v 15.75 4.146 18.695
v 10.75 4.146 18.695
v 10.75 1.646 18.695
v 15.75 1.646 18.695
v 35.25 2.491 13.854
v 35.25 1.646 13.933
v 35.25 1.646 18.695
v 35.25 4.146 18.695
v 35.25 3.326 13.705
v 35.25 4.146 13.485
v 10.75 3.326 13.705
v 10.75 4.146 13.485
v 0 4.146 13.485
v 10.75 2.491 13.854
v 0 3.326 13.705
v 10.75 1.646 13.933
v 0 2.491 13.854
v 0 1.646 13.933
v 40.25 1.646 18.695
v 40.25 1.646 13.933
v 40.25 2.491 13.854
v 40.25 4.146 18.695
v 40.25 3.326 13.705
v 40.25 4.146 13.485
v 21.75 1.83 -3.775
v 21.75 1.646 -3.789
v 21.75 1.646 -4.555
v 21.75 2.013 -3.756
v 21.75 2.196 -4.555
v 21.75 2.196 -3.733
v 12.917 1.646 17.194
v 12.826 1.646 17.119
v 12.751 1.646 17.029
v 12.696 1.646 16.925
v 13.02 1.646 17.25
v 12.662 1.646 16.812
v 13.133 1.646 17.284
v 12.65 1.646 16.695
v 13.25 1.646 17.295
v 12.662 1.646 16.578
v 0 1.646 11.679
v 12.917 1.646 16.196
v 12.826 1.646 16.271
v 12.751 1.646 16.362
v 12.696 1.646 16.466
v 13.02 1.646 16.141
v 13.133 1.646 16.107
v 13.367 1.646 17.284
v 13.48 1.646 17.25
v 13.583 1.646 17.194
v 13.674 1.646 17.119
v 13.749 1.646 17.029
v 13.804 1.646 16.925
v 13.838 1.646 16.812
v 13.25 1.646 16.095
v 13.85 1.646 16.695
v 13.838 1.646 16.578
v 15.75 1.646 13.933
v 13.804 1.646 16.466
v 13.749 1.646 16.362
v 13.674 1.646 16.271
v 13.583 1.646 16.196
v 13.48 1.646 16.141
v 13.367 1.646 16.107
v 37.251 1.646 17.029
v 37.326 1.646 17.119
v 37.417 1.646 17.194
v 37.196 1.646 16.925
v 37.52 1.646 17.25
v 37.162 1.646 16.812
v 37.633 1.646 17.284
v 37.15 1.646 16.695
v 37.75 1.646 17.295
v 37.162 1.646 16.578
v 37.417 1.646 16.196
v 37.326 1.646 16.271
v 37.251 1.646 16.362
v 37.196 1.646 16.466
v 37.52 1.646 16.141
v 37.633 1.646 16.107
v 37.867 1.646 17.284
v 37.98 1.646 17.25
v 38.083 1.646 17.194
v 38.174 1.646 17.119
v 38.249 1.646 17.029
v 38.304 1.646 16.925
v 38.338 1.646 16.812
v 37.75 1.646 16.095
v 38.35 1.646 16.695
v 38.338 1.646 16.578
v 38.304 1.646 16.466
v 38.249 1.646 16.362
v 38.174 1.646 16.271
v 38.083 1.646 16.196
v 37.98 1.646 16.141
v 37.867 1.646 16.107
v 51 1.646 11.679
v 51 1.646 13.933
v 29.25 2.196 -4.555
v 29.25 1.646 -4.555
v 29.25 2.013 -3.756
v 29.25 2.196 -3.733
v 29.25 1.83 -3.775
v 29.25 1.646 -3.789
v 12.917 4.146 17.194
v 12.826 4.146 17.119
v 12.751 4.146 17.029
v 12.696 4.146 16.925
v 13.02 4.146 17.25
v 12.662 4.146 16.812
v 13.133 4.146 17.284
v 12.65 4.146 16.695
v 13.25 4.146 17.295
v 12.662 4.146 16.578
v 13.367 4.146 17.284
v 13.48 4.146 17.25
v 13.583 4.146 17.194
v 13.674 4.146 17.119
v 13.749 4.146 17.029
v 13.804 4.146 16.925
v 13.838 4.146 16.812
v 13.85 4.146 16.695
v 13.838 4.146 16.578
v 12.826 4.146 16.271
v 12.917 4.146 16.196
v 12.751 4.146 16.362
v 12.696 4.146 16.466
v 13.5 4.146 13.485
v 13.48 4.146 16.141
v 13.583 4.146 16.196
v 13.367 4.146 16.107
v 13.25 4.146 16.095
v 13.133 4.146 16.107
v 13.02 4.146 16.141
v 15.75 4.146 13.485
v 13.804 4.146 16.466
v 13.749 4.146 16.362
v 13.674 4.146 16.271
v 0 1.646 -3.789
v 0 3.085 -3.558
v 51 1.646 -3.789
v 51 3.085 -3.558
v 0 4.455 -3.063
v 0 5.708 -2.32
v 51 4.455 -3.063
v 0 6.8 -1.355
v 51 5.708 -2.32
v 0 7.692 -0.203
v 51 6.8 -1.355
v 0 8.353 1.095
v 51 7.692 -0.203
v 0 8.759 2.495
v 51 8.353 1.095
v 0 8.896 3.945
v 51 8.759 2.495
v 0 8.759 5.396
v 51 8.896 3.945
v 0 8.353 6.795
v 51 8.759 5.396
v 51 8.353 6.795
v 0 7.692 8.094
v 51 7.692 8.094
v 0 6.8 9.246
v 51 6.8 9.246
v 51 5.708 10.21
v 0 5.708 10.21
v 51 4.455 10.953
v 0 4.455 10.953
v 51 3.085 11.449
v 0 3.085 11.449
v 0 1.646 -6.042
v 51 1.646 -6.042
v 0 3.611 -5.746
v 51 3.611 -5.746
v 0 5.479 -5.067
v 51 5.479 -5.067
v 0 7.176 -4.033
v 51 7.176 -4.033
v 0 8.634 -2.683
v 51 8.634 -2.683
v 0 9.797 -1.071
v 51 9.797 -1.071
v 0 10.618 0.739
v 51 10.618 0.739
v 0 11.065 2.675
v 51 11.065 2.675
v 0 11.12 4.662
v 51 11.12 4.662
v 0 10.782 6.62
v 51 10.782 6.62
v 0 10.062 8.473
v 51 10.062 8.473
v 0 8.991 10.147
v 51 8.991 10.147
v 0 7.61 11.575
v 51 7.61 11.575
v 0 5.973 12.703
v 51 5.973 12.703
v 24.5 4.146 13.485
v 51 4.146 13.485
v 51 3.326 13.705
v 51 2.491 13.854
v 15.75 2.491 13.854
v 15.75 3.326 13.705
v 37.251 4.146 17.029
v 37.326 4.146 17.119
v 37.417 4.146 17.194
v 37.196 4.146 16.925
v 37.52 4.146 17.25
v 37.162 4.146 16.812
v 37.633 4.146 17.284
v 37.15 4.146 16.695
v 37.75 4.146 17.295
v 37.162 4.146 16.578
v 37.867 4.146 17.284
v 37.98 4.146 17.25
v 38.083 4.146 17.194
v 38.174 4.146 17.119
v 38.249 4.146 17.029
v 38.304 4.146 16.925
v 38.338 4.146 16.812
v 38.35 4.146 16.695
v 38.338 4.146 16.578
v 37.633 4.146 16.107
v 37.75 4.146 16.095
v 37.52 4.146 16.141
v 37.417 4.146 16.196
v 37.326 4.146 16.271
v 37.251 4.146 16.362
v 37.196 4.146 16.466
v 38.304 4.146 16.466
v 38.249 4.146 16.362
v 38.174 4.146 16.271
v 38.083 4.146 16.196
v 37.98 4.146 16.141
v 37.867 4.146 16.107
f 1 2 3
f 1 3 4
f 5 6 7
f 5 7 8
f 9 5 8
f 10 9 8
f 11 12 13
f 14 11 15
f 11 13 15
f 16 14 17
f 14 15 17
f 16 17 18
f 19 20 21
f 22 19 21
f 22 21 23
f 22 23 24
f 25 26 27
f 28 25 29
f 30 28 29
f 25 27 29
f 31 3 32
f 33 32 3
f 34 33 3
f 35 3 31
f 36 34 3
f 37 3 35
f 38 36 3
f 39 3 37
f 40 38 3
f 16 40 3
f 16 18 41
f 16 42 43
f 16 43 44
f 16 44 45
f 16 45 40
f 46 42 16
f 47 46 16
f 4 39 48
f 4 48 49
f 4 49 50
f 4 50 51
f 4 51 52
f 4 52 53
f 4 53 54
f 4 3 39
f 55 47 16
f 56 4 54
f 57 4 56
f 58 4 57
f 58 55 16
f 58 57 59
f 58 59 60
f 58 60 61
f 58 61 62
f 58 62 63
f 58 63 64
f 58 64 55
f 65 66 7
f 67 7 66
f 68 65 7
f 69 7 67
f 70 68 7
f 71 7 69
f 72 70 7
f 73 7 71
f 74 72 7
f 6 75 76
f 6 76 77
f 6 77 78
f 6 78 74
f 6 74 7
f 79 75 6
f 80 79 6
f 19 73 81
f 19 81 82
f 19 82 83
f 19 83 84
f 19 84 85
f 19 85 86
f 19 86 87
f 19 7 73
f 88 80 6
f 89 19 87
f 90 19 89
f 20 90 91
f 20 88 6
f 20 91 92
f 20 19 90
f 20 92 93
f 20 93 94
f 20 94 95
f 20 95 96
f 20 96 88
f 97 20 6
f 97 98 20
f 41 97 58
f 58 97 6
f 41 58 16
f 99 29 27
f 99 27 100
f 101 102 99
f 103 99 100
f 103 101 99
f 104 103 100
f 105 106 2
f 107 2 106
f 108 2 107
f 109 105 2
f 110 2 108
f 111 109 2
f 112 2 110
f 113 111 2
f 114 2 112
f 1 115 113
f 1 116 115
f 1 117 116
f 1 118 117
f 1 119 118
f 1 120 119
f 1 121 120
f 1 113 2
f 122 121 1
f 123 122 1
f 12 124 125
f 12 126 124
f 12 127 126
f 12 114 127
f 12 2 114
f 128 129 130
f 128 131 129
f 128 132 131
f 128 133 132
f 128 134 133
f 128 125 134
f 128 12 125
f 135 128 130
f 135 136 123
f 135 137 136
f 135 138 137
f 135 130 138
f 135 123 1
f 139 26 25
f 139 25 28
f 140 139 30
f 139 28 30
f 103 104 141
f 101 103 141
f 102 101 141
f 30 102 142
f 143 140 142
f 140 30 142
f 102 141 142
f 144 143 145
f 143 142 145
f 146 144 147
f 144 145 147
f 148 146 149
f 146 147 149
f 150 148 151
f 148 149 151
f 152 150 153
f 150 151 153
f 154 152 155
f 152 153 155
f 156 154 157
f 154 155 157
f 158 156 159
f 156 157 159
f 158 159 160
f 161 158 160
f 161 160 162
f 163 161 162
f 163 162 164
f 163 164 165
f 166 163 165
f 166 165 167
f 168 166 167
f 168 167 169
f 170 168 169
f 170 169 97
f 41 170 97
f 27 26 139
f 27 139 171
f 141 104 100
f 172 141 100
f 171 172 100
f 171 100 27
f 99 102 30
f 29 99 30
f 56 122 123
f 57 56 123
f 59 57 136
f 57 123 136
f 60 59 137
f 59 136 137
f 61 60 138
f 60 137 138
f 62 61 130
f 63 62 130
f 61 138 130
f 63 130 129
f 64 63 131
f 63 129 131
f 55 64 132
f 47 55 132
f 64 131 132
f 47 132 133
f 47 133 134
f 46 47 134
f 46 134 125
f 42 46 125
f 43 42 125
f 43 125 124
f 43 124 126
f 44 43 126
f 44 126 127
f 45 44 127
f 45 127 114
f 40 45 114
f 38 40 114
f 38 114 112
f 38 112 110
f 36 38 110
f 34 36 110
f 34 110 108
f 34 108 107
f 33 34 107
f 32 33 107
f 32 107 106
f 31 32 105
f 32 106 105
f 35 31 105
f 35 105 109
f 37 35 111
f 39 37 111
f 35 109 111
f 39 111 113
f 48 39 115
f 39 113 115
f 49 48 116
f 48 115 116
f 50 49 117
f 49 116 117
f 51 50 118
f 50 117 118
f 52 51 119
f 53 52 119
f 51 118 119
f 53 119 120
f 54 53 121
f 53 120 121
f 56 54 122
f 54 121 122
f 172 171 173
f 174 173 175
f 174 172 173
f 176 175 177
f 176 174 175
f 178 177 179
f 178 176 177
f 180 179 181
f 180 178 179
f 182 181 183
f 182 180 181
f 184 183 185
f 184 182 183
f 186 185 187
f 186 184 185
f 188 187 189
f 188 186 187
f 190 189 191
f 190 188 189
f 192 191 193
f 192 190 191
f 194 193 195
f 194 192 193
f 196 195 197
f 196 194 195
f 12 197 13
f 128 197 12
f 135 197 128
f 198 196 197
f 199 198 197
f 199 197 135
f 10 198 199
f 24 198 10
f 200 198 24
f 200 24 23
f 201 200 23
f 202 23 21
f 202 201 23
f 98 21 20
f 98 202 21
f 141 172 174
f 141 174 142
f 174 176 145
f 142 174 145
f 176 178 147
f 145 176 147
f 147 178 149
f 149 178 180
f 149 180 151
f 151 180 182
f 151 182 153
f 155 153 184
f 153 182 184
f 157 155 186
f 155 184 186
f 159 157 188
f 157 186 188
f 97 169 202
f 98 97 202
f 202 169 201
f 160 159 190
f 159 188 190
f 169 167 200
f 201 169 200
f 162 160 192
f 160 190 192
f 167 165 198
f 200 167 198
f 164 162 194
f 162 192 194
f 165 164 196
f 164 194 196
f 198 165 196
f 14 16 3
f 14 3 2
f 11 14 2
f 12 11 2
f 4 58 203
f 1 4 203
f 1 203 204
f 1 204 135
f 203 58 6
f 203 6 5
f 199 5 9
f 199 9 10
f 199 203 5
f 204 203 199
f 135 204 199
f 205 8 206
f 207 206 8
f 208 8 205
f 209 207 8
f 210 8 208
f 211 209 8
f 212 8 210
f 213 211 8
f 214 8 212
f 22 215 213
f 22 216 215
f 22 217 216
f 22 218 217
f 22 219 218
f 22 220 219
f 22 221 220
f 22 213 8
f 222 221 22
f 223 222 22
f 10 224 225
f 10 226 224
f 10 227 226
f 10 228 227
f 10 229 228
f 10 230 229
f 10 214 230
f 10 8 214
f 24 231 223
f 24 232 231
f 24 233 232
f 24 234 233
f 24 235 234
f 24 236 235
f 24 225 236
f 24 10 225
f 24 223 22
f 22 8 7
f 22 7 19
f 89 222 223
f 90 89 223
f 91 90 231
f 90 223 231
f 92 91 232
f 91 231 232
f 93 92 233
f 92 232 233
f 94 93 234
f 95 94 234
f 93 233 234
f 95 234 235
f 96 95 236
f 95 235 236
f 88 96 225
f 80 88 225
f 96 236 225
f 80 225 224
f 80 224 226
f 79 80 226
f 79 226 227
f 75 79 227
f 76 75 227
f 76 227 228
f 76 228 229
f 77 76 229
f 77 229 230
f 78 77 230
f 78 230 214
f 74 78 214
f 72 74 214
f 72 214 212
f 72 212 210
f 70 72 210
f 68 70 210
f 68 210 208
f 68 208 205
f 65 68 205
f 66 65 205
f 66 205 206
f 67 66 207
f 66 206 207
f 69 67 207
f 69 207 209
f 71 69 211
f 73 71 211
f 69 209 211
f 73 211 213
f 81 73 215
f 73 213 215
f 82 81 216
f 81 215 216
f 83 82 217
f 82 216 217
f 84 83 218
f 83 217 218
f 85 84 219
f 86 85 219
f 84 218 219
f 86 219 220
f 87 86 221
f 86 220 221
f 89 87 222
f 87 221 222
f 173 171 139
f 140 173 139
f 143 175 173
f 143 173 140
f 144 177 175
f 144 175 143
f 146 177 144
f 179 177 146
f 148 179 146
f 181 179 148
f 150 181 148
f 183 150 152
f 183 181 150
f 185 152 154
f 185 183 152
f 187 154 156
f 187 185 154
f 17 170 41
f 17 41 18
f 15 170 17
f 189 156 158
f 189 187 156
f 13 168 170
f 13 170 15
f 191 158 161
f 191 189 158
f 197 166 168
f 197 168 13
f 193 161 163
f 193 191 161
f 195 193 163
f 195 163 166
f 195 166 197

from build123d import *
from build123d.topology import SkipClean

# Parameters (mm, degrees)
SKETCH1_W                = 34
SKETCH1_H                = 30
BOSS_EXTRUDE2_DEPTH      = 51
SKETCH3_R                = 2.55
CUT_EXTRUDE3_DEPTH       = 10
SKETCH5_R                = 7.75
CUT_EXTRUDE4_DEPTH       = 51
SKETCH6_W                = 7
SKETCH6_H                = 30
CUT_EXTRUDE6_DEPTH       = 51
CUT_EXTRUDE7_DEPTH       = 51
CUT_EXTRUDE9_DEPTH       = 1.5
CUT_EXTRUDE9_DEPTH_BACK  = 1.5
BOSS_EXTRUDE5_DEPTH      = 51
CUT_EXTRUDE10_DEPTH      = 13
CUT_EXTRUDE11_START      = -13
CUT_EXTRUDE11_DEPTH      = 13
SKETCH13_W               = 2
SKETCH13_H               = 6
CUT_EXTRUDE12_DEPTH      = 2
CUT_EXTRUDE13_DEPTH      = 13
CUT_EXTRUDE13_DEPTH_BACK = 11
BOSS_EXTRUDE6_DEPTH      = 2.25
BOSS_EXTRUDE7_DEPTH      = 2.25
BOSS_EXTRUDE8_DEPTH      = 2.25
BOSS_EXTRUDE9_DEPTH      = 2.25
SKETCH22_W               = 5
SKETCH22_H               = 6
BOSS_EXTRUDE10_DEPTH     = 1
SKETCH24_W               = 5
SKETCH24_H               = 6
BOSS_EXTRUDE11_DEPTH     = 1
SKETCH25_R               = 0.6
CUT_EXTRUDE14_DEPTH      = 20
SKETCH26_R               = 2.55
BOSS_EXTRUDE12_DEPTH     = 1.5
CUT_EXTRUDE17_DEPTH      = 60


with BuildPart() as part:
    # Sketch1 → Boss-Extrude2 (new body)
    with BuildSketch(Plane(origin=(0, 0, 0), x_dir=(0, 0, -1), z_dir=(1, 0, 0))):
        with Locations((-3.945183177, 6.145902028)):
            Rectangle(SKETCH1_W, SKETCH1_H)
    extrude(amount=BOSS_EXTRUDE2_DEPTH)

    # Sketch3 → Cut-Extrude3 (cut)
    with BuildSketch(Plane(origin=(0, 0, -13.054816823), x_dir=(-1, 0, 0), z_dir=(0, 0, -1))):
        with Locations((-25.5, -1.354097972)):
            Circle(SKETCH3_R)
    extrude(amount=-CUT_EXTRUDE3_DEPTH, mode=Mode.SUBTRACT)

    # Sketch5 → Cut-Extrude4 (cut)
    with BuildSketch(Plane(origin=(51, 0, 0), x_dir=(0, 0, -1), z_dir=(1, 0, 0))):
        with Locations((-3.945183177, 1.145902028)):
            Circle(SKETCH5_R)
    extrude(amount=-CUT_EXTRUDE4_DEPTH, mode=Mode.SUBTRACT)

    # Sketch6 → Cut-Extrude6 (cut)
    with BuildSketch(Plane(origin=(51, 0, 0), x_dir=(0, 0, -1), z_dir=(1, 0, 0))):
        with Locations((9.554816823, 6.145902028)):
            Rectangle(SKETCH6_W, SKETCH6_H)
    extrude(amount=-CUT_EXTRUDE6_DEPTH, mode=Mode.SUBTRACT)

    # Sketch7 → Cut-Extrude7 (cut)
    with BuildSketch(Plane(origin=(51, 0, 0), x_dir=(0, 0, -1), z_dir=(1, 0, 0))):
        with BuildLine():
            Line((-3.945183177, -8.854097972), (-20.945183177, -8.854097972))
            Line((-20.945183177, -8.854097972), (-20.945183177, 21.145902028))
            Line((-20.945183177, 21.145902028), (6.054816823, 21.145902028))
            Line((6.054816823, 21.145902028), (6.054816823, 1.145902028))
            ThreePointArc((6.054816823, 1.145902028), (-11.016250989, 8.21696984), (-3.945183177, -8.854097972))
        make_face()
    extrude(amount=-CUT_EXTRUDE7_DEPTH, mode=Mode.SUBTRACT)

    # Sketch8 → Cut-Extrude9 (cut, two sides: drawn at the far end of the back side and taken through both)
    with BuildSketch(Plane(origin=(0, 0, -3.054816823), x_dir=(-1, 0, 0), z_dir=(0, 0, -1)).offset(-CUT_EXTRUDE9_DEPTH_BACK)):
        Polygon((-21.75, -2.180131646), (-21.75, -4.904097972), (-29.25, -4.904097972), (-29.25, -2.180131646), (-29.25, 2.195902028), (-21.75, 2.195902028), align=None)
    extrude(amount=CUT_EXTRUDE9_DEPTH + CUT_EXTRUDE9_DEPTH_BACK, mode=Mode.SUBTRACT)

    # Sketch10 → Boss-Extrude5 (add)
    with BuildSketch(Plane(origin=(51, 0, 0), x_dir=(0, 0, -1), z_dir=(1, 0, 0))):
        Polygon((-17.695183177, 1.145902028), (-17.695183177, 4.145902028), (-11.695183177, 4.145902028), (-11.695183177, 1.145902028), (-11.695183177, -1.854097972), (-17.695183177, -1.854097972), align=None)
    extrude(amount=-BOSS_EXTRUDE5_DEPTH)

    # Sketch11 → Cut-Extrude10 (cut)
    with BuildSketch(Plane(origin=(51, 0, 0), x_dir=(0, 0, -1), z_dir=(1, 0, 0))):
        with BuildLine():
            Line((-13.484575191, -1.854097972), (-17.695183177, -1.854097972))
            Line((-17.695183177, -1.854097972), (-17.695183177, 4.145902028))
            Line((-17.695183177, 4.145902028), (-13.484575191, 4.145902028))
            ThreePointArc((-13.484575191, 4.145902028), (-13.945183177, 1.145902028), (-13.484575191, -1.854097972))
        make_face()
    extrude(amount=-CUT_EXTRUDE10_DEPTH, mode=Mode.SUBTRACT)

    # Sketch12 → Cut-Extrude11 (cut)
    with BuildSketch(Plane.ZY.offset(CUT_EXTRUDE11_START)):
        with BuildLine():
            Line((13.484575191, -1.854097972), (17.695183177, -1.854097972))
            Line((17.695183177, -1.854097972), (17.695183177, 4.145902028))
            Line((17.695183177, 4.145902028), (13.484575191, 4.145902028))
            ThreePointArc((13.484575191, 4.145902028), (13.945183177, 1.145902028), (13.484575191, -1.854097972))
        make_face()
    extrude(amount=CUT_EXTRUDE11_DEPTH, mode=Mode.SUBTRACT)

    # Sketch13 → Cut-Extrude12 (cut)
    with BuildSketch(Plane.XY.offset(17.695183177)):
        with Locations((25.5, 1.145902028)):
            Rectangle(SKETCH13_W, SKETCH13_H)
    extrude(amount=-CUT_EXTRUDE12_DEPTH, mode=Mode.SUBTRACT)

    # Sketch15 → Cut-Extrude13 (cut, two sides: drawn at the far end of the back side and taken through both)
    with SkipClean():  # the faces are left unmerged after this step: merging them gives an invalid solid
        with BuildSketch(Plane(origin=(24.5, 0, 0), x_dir=(0, 0, -1), z_dir=(1, 0, 0)).offset(-CUT_EXTRUDE13_DEPTH_BACK)):
            with BuildLine():
                Line((-17.695183177, 4.145902028), (-17.695183177, -1.854097972))
                Line((-17.695183177, -1.854097972), (-13.484575191, -1.854097972))
                ThreePointArc((-13.484575191, -1.854097972), (-13.945183177, 1.145902028), (-13.484575191, 4.145902028))
                Line((-13.484575191, 4.145902028), (-17.695183177, 4.145902028))
            make_face()
        extrude(amount=CUT_EXTRUDE13_DEPTH + CUT_EXTRUDE13_DEPTH_BACK, mode=Mode.SUBTRACT)

    # Sketch17 → Boss-Extrude6 (add)
    with SkipClean():  # the faces are left unmerged after this step: merging them gives an invalid solid
        with BuildSketch(Plane(origin=(38, 0, 0), x_dir=(0, 0, -1), z_dir=(1, 0, 0))):
            with BuildLine():
                Line((-13.484575191, 4.145902028), (-17.695183177, 4.145902028))
                Line((-17.695183177, 4.145902028), (-17.695183177, -1.854097972))
                Line((-17.695183177, -1.854097972), (-13.484575191, -1.854097972))
                ThreePointArc((-13.484575191, -1.854097972), (-13.945183177, 1.145902028), (-13.484575191, 4.145902028))
            make_face()
        extrude(amount=BOSS_EXTRUDE6_DEPTH)

    # Sketch19 → Boss-Extrude7 (add)
    with SkipClean():  # the faces are left unmerged after this step: merging them gives an invalid solid
        with BuildSketch(Plane.ZY.offset(-13)):
            with BuildLine():
                Line((13.484575191, 4.145902028), (17.695183177, 4.145902028))
                Line((17.695183177, 4.145902028), (17.695183177, -1.854097972))
                Line((17.695183177, -1.854097972), (13.484575191, -1.854097972))
                ThreePointArc((13.484575191, -1.854097972), (13.945183177, 1.145902028), (13.484575191, 4.145902028))
            make_face()
        extrude(amount=BOSS_EXTRUDE7_DEPTH)

    # Sketch20 → Boss-Extrude8 (add)
    with SkipClean():  # the faces are left unmerged after this step: merging them gives an invalid solid
        with BuildSketch(Plane(origin=(13.5, 0, 0), x_dir=(0, 0, -1), z_dir=(1, 0, 0))):
            with BuildLine():
                Line((-17.695183177, -1.854097972), (-17.695183177, 4.145902028))
                Line((-17.695183177, 4.145902028), (-13.484575191, 4.145902028))
                ThreePointArc((-13.484575191, 4.145902028), (-13.945183177, 1.145902028), (-13.484575191, -1.854097972))
                Line((-13.484575191, -1.854097972), (-17.695183177, -1.854097972))
            make_face()
        extrude(amount=BOSS_EXTRUDE8_DEPTH)

    # Sketch21 → Boss-Extrude9 (add)
    with SkipClean():  # the faces are left unmerged after this step: merging them gives an invalid solid
        with BuildSketch(Plane.ZY.offset(-37.5)):
            with BuildLine():
                Line((13.484575191, 4.145902028), (17.695183177, 4.145902028))
                Line((17.695183177, 4.145902028), (17.695183177, -1.854097972))
                Line((17.695183177, -1.854097972), (13.484575191, -1.854097972))
                ThreePointArc((13.484575191, -1.854097972), (13.945183177, 1.145902028), (13.484575191, 4.145902028))
            make_face()
        extrude(amount=BOSS_EXTRUDE9_DEPTH)

    # Sketch22 → Boss-Extrude10 (add)
    with SkipClean():  # the faces are left unmerged after this step: merging them gives an invalid solid
        with BuildSketch(Plane.XY.offset(17.695183177)):
            with Locations((37.75, 1.145902028)):
                Rectangle(SKETCH22_W, SKETCH22_H)
        extrude(amount=BOSS_EXTRUDE10_DEPTH)

    # Sketch24 → Boss-Extrude11 (add)
    with SkipClean():  # the faces are left unmerged after this step: merging them gives an invalid solid
        with BuildSketch(Plane.XY.offset(17.695183177)):
            with Locations((13.25, 1.145902028)):
                Rectangle(SKETCH24_W, SKETCH24_H)
        extrude(amount=BOSS_EXTRUDE11_DEPTH)

    # Sketch25 → Cut-Extrude14 (cut)
    with SkipClean():  # the faces are left unmerged after this step: merging them gives an invalid solid
        with BuildSketch(Plane(origin=(0, 4.145902028, 0), x_dir=(1, 0, 0), z_dir=(0, 1, 0))):
            with Locations((13.25, -16.695183177)):
                Circle(SKETCH25_R)
            with Locations((37.75, -16.695183177)):
                Circle(SKETCH25_R)
        extrude(amount=-CUT_EXTRUDE14_DEPTH, mode=Mode.SUBTRACT)

    # Sketch26 → Boss-Extrude12 (add)
    with SkipClean():  # the faces are left unmerged after this step: merging them gives an invalid solid
        with BuildSketch(Plane(origin=(0, 0, -6.054816823), x_dir=(-1, 0, 0), z_dir=(0, 0, -1))):
            with Locations((-25.5, -1.354097972)):
                Circle(SKETCH26_R)
        extrude(amount=-BOSS_EXTRUDE12_DEPTH)

    # Sketch27 → Cut-Extrude17 (cut)
    with SkipClean():  # the faces are left unmerged after this step: merging them gives an invalid solid
        with BuildSketch(Plane(origin=(51, 0, 0), x_dir=(0, 0, -1), z_dir=(1, 0, 0))):
            Polygon((-18.695183177, 1.145902028), (-18.695183177, 1.645902028), (6.594766684, 1.645902028), (6.594766684, 1.145902028), (6.594766684, 0.645902028), (6.594766684, -9.845584232), (-18.695183177, -9.845584232), (-18.695183177, 0.645902028), align=None)
        extrude(amount=-CUT_EXTRUDE17_DEPTH, mode=Mode.SUBTRACT)


solid = part.part
